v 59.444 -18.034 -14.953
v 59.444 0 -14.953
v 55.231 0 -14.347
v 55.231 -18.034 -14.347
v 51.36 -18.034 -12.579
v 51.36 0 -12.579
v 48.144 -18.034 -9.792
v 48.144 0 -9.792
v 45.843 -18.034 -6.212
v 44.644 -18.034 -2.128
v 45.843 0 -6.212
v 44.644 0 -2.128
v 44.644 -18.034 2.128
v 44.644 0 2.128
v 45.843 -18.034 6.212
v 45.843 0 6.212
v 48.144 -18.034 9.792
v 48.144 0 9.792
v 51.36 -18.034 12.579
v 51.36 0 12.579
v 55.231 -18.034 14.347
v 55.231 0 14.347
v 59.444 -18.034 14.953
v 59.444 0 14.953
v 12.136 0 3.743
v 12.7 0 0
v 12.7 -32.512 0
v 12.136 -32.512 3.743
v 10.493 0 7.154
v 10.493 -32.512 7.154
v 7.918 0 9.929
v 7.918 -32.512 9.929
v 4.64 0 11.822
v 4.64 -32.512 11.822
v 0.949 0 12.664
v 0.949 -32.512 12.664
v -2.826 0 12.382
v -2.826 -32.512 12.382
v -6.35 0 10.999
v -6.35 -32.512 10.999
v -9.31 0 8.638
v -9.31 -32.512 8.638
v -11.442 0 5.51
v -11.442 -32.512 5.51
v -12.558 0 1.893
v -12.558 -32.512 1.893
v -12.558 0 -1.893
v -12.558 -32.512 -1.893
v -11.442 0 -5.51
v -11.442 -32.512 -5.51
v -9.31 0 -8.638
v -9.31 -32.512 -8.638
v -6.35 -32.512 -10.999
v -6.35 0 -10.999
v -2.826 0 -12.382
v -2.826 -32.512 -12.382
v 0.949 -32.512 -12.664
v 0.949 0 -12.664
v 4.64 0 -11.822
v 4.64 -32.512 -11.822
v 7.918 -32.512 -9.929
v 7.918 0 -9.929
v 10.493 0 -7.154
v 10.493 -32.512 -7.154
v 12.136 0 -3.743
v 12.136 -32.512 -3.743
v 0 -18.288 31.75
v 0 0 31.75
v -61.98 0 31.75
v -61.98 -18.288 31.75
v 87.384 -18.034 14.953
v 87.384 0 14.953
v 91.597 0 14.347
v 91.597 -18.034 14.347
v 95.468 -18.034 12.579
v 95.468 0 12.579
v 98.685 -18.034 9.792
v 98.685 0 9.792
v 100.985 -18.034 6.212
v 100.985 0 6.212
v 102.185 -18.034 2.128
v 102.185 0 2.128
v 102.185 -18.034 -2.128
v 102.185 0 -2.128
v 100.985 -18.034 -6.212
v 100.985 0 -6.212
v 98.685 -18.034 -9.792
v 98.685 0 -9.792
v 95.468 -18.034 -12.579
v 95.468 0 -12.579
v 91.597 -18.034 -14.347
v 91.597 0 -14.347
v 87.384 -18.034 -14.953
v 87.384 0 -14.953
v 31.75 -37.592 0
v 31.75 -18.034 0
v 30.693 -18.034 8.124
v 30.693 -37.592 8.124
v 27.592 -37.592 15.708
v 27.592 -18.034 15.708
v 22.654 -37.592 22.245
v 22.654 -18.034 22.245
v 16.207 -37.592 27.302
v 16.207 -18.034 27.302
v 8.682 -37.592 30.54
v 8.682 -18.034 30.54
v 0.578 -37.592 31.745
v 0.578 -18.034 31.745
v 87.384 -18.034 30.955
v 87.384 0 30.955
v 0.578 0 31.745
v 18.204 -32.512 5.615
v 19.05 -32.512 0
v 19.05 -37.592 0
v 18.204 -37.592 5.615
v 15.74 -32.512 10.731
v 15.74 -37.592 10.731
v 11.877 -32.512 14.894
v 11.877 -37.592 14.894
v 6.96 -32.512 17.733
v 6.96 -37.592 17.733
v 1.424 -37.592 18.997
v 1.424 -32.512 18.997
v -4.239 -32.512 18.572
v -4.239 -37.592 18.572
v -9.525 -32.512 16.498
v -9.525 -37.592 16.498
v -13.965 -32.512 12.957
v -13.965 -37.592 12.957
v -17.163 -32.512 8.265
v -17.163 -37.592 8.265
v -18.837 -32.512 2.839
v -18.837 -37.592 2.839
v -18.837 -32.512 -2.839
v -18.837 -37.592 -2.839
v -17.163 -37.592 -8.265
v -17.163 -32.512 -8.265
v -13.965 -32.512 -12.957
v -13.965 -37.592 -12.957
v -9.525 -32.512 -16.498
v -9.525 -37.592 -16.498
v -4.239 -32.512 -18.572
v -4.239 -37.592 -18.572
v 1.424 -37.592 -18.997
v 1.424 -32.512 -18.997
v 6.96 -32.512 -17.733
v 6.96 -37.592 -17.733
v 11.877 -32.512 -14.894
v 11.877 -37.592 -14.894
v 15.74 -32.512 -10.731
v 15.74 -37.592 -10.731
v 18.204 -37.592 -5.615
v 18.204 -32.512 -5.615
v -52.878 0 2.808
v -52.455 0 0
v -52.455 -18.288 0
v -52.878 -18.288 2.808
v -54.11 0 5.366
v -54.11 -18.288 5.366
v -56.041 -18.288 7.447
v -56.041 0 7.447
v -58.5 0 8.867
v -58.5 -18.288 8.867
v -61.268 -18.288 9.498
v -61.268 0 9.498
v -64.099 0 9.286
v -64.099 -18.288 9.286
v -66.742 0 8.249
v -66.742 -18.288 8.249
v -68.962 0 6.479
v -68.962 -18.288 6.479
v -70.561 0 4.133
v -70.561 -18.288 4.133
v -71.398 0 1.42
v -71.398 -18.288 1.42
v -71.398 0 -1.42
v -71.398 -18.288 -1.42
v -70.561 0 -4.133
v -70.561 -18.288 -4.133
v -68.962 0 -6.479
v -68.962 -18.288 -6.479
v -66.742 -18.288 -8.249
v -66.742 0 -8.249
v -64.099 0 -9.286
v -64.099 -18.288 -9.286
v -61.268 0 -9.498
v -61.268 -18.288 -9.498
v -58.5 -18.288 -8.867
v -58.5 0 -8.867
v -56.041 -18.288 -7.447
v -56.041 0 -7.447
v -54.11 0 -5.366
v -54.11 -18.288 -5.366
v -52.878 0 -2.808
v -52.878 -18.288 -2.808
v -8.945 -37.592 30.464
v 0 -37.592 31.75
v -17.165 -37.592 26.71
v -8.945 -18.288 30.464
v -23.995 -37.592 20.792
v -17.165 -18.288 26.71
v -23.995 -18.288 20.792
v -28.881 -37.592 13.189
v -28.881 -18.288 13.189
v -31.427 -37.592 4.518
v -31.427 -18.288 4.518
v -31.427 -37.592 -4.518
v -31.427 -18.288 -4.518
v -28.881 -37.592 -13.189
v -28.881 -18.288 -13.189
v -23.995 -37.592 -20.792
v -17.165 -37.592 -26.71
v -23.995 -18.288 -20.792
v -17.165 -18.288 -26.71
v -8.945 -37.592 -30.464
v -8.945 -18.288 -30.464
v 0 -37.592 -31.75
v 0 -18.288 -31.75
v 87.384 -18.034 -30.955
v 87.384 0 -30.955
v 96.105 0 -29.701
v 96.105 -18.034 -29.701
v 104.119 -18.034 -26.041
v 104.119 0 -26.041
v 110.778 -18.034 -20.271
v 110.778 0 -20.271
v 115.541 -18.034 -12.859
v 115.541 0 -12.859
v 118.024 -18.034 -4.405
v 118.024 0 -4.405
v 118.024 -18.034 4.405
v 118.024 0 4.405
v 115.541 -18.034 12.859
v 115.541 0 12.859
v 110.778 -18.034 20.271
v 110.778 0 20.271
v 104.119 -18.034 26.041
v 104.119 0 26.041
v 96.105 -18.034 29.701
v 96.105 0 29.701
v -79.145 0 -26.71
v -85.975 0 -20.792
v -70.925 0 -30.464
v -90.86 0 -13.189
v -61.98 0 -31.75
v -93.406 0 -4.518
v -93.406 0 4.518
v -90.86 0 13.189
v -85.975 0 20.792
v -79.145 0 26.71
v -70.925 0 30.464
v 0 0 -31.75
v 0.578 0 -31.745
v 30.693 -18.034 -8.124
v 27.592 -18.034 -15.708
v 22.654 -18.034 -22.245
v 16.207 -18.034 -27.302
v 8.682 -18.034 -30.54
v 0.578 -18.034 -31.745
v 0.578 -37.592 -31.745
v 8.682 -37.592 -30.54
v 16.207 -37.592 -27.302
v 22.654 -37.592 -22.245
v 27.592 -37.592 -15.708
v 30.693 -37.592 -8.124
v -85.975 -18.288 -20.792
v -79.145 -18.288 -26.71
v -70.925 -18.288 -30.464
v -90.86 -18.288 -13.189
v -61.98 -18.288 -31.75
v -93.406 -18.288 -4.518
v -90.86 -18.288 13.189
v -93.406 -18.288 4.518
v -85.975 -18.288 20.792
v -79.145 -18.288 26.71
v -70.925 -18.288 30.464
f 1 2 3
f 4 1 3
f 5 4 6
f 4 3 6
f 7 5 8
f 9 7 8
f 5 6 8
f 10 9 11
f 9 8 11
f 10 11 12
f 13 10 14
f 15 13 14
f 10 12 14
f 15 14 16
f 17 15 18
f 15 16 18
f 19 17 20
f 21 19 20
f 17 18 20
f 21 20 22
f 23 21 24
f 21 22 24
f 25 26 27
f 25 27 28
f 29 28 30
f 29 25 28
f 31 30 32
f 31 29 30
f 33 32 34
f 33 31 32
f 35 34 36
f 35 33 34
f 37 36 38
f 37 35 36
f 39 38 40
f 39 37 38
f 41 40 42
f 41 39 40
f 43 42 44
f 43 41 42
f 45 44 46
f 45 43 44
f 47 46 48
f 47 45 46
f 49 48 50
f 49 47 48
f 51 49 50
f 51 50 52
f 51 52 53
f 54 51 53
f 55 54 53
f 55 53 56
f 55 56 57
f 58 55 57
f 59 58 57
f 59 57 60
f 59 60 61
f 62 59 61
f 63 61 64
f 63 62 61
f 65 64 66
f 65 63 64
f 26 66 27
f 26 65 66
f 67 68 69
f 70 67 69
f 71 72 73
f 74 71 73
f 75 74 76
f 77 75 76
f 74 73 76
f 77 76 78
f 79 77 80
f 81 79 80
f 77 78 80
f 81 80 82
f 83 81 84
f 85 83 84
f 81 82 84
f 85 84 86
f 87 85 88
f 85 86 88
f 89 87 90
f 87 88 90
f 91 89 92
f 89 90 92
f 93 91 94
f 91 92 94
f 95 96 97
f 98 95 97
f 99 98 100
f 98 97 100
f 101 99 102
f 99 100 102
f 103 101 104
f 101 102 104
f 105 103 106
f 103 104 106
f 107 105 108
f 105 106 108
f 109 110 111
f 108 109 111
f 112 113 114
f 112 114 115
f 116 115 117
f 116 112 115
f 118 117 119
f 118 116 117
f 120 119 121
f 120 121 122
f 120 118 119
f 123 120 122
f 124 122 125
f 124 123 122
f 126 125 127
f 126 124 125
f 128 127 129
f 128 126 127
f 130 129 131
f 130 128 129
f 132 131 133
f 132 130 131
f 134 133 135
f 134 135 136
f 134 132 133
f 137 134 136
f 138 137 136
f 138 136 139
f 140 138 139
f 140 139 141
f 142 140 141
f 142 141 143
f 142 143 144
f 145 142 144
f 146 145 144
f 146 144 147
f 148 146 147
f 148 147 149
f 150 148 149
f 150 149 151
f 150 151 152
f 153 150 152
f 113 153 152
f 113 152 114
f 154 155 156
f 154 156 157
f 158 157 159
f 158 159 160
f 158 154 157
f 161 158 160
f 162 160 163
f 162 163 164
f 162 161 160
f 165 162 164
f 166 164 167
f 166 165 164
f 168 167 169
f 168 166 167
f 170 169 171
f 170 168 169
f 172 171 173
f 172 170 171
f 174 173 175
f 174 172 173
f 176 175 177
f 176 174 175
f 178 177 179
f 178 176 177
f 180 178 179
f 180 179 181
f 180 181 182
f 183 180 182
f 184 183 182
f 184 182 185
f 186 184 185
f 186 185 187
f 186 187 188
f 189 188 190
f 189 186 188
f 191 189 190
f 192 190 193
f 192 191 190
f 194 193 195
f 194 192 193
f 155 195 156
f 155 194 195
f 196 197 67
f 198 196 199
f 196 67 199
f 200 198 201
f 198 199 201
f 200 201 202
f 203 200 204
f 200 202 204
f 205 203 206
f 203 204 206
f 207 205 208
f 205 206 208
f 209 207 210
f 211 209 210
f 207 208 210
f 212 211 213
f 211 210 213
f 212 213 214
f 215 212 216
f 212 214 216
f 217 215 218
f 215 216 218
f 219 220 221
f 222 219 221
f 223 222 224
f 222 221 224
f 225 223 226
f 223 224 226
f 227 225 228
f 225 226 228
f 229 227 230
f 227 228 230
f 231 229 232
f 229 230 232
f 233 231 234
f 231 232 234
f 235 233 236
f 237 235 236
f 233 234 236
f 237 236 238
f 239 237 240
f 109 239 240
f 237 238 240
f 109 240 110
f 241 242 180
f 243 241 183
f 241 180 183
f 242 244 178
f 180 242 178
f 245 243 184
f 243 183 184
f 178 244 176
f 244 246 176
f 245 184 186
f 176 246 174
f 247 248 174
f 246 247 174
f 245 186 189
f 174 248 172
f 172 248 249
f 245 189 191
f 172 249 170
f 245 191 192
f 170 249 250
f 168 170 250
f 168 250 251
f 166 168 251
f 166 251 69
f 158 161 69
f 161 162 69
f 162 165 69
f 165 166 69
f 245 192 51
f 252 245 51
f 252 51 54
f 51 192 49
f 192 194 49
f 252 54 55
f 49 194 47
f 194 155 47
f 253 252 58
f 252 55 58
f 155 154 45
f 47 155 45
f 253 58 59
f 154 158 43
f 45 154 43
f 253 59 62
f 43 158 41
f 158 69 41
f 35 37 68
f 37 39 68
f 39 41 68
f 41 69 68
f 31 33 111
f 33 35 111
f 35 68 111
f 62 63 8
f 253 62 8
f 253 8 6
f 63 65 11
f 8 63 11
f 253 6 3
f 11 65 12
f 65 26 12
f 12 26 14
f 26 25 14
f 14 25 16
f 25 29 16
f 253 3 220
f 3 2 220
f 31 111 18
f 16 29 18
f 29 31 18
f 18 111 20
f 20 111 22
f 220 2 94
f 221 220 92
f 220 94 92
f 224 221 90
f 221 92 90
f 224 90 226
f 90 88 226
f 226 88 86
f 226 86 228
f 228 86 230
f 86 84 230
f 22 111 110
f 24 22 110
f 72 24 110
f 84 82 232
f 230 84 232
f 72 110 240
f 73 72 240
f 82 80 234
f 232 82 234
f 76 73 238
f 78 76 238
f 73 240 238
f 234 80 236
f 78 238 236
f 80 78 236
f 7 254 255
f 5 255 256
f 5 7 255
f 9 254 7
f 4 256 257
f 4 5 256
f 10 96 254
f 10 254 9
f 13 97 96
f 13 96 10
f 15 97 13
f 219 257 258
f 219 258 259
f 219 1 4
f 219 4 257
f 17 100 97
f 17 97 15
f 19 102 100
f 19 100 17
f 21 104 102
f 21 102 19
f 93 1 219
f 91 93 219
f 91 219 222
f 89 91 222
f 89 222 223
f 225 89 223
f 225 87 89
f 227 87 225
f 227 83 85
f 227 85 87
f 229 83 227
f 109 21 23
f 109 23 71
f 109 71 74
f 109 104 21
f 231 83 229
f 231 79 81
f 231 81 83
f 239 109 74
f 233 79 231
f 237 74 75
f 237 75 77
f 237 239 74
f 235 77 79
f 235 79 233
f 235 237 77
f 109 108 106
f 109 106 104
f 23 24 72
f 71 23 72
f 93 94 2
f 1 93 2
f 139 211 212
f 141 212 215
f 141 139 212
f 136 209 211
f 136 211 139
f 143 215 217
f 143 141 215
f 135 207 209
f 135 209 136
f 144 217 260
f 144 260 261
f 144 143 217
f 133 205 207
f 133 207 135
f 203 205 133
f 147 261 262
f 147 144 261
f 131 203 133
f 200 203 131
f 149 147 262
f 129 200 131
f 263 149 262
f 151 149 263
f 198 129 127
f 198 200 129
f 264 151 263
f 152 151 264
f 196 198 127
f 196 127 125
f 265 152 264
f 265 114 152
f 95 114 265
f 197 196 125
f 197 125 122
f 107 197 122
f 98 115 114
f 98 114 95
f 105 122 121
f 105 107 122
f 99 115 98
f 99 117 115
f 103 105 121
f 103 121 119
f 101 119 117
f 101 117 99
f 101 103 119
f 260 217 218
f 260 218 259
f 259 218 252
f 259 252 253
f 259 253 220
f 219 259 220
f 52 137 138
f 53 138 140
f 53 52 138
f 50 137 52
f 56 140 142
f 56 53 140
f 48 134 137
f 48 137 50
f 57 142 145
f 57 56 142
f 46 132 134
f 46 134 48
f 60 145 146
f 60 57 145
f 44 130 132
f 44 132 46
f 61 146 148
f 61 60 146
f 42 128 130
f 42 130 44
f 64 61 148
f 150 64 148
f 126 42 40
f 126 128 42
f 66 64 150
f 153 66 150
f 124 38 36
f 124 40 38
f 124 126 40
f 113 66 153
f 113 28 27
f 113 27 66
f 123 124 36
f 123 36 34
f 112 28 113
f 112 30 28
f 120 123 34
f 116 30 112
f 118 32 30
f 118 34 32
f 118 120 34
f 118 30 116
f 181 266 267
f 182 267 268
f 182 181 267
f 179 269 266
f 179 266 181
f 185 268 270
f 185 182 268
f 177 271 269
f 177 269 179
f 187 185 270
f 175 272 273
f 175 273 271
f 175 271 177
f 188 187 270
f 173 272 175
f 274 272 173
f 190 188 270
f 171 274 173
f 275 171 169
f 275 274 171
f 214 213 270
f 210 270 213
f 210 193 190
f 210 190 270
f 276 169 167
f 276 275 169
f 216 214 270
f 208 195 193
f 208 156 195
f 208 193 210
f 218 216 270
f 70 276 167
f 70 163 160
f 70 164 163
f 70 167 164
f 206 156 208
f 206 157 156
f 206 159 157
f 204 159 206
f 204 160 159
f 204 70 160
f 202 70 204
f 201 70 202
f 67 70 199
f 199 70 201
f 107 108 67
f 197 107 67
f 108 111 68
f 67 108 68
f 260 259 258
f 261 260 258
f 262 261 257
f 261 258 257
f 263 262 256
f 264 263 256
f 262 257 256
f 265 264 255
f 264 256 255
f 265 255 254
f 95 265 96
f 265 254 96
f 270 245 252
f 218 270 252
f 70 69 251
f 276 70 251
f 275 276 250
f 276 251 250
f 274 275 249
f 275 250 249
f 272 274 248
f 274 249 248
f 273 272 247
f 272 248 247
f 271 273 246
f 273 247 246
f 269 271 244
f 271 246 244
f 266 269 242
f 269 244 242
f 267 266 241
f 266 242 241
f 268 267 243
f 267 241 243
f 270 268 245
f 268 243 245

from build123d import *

# Parameters (mm, degrees)
F0_R     = 9.525
F1_DEPTH = 18.288
F0_R_2   = 19.05
F2_DEPTH = 37.592
F3_DEPTH = 18.034
F0_R_3   = 12.7
F5_DEPTH = 32.512


# Not quite as in the source:
# - the program builds the solid bodies; features that only make, move or delete a surface that nothing else refers to are left out


with BuildPart() as f1:
    # F0 (on Front) → F1 (new body)
    with BuildSketch(Plane.XZ):
        with BuildLine():
            ThreePointArc((0, -31.75), (-31.75, 0), (0, 31.75))
            Line((0, 31.75), (-61.9795769453, 31.75))
            ThreePointArc((-61.9795769453, 31.75), (-93.7295769453, 0), (-61.9795769453, -31.75))
            Line((-61.9795769453, -31.75), (0, -31.75))
        make_face()
        with Locations((-61.9795769453, 0)):
            Circle(F0_R, mode=Mode.SUBTRACT)
    extrude(amount=F1_DEPTH)

    # F0 (on Front) → F2 (join)
    with BuildSketch(Plane.XZ):
        with BuildLine():
            Line((0.5778842542, 31.7447405059), (0, 31.75))
            ThreePointArc((0, 31.75), (-31.75, 0), (0, -31.75))
            Line((0, -31.75), (0.5778842542, -31.7447405059))
            ThreePointArc((0.5778842542, -31.7447405059), (22.6540319267, -22.2453891282), (31.75, 0))
            ThreePointArc((31.75, 0), (22.6540319267, 22.2453891282), (0.5778842542, 31.7447405059))
        make_face()
        Circle(F0_R_2, mode=Mode.SUBTRACT)
    extrude(amount=F2_DEPTH)

    # F0 (on Front) → F3 (join)
    with BuildSketch(Plane.XZ):
        with BuildLine():
            Line((87.3840512359, 30.9546921229), (0.5778842542, 31.7447405059))
            ThreePointArc((0.5778842542, 31.7447405059), (22.6540319267, 22.2453891282), (31.75, 0))
            ThreePointArc((31.75, 0), (22.6540319267, -22.2453891282), (0.5778842542, -31.7447405059))
            Line((0.5778842542, -31.7447405059), (87.3840512359, -30.9546921229))
            ThreePointArc((87.3840512359, -30.9546921229), (118.3387433588, 0), (87.3840512359, 30.9546921229))
        make_face()
        with BuildLine():
            ThreePointArc((59.4440512359, -14.9526921229), (44.491359113, 0), (59.4440512359, 14.9526921229))
            Line((59.4440512359, 14.9526921229), (87.3840512359, 14.9526921229))
            ThreePointArc((87.3840512359, 14.9526921229), (102.3367433588, 0), (87.3840512359, -14.9526921229))
            Line((87.3840512359, -14.9526921229), (59.4440512359, -14.9526921229))
        make_face(mode=Mode.SUBTRACT)
    extrude(amount=F3_DEPTH)

    # F0 (on Front) → F5 (join)
    with BuildSketch(Plane.XZ):
        Circle(F0_R_2)
        Circle(F0_R_3, mode=Mode.SUBTRACT)
    extrude(amount=F5_DEPTH)


solid = f1.part
